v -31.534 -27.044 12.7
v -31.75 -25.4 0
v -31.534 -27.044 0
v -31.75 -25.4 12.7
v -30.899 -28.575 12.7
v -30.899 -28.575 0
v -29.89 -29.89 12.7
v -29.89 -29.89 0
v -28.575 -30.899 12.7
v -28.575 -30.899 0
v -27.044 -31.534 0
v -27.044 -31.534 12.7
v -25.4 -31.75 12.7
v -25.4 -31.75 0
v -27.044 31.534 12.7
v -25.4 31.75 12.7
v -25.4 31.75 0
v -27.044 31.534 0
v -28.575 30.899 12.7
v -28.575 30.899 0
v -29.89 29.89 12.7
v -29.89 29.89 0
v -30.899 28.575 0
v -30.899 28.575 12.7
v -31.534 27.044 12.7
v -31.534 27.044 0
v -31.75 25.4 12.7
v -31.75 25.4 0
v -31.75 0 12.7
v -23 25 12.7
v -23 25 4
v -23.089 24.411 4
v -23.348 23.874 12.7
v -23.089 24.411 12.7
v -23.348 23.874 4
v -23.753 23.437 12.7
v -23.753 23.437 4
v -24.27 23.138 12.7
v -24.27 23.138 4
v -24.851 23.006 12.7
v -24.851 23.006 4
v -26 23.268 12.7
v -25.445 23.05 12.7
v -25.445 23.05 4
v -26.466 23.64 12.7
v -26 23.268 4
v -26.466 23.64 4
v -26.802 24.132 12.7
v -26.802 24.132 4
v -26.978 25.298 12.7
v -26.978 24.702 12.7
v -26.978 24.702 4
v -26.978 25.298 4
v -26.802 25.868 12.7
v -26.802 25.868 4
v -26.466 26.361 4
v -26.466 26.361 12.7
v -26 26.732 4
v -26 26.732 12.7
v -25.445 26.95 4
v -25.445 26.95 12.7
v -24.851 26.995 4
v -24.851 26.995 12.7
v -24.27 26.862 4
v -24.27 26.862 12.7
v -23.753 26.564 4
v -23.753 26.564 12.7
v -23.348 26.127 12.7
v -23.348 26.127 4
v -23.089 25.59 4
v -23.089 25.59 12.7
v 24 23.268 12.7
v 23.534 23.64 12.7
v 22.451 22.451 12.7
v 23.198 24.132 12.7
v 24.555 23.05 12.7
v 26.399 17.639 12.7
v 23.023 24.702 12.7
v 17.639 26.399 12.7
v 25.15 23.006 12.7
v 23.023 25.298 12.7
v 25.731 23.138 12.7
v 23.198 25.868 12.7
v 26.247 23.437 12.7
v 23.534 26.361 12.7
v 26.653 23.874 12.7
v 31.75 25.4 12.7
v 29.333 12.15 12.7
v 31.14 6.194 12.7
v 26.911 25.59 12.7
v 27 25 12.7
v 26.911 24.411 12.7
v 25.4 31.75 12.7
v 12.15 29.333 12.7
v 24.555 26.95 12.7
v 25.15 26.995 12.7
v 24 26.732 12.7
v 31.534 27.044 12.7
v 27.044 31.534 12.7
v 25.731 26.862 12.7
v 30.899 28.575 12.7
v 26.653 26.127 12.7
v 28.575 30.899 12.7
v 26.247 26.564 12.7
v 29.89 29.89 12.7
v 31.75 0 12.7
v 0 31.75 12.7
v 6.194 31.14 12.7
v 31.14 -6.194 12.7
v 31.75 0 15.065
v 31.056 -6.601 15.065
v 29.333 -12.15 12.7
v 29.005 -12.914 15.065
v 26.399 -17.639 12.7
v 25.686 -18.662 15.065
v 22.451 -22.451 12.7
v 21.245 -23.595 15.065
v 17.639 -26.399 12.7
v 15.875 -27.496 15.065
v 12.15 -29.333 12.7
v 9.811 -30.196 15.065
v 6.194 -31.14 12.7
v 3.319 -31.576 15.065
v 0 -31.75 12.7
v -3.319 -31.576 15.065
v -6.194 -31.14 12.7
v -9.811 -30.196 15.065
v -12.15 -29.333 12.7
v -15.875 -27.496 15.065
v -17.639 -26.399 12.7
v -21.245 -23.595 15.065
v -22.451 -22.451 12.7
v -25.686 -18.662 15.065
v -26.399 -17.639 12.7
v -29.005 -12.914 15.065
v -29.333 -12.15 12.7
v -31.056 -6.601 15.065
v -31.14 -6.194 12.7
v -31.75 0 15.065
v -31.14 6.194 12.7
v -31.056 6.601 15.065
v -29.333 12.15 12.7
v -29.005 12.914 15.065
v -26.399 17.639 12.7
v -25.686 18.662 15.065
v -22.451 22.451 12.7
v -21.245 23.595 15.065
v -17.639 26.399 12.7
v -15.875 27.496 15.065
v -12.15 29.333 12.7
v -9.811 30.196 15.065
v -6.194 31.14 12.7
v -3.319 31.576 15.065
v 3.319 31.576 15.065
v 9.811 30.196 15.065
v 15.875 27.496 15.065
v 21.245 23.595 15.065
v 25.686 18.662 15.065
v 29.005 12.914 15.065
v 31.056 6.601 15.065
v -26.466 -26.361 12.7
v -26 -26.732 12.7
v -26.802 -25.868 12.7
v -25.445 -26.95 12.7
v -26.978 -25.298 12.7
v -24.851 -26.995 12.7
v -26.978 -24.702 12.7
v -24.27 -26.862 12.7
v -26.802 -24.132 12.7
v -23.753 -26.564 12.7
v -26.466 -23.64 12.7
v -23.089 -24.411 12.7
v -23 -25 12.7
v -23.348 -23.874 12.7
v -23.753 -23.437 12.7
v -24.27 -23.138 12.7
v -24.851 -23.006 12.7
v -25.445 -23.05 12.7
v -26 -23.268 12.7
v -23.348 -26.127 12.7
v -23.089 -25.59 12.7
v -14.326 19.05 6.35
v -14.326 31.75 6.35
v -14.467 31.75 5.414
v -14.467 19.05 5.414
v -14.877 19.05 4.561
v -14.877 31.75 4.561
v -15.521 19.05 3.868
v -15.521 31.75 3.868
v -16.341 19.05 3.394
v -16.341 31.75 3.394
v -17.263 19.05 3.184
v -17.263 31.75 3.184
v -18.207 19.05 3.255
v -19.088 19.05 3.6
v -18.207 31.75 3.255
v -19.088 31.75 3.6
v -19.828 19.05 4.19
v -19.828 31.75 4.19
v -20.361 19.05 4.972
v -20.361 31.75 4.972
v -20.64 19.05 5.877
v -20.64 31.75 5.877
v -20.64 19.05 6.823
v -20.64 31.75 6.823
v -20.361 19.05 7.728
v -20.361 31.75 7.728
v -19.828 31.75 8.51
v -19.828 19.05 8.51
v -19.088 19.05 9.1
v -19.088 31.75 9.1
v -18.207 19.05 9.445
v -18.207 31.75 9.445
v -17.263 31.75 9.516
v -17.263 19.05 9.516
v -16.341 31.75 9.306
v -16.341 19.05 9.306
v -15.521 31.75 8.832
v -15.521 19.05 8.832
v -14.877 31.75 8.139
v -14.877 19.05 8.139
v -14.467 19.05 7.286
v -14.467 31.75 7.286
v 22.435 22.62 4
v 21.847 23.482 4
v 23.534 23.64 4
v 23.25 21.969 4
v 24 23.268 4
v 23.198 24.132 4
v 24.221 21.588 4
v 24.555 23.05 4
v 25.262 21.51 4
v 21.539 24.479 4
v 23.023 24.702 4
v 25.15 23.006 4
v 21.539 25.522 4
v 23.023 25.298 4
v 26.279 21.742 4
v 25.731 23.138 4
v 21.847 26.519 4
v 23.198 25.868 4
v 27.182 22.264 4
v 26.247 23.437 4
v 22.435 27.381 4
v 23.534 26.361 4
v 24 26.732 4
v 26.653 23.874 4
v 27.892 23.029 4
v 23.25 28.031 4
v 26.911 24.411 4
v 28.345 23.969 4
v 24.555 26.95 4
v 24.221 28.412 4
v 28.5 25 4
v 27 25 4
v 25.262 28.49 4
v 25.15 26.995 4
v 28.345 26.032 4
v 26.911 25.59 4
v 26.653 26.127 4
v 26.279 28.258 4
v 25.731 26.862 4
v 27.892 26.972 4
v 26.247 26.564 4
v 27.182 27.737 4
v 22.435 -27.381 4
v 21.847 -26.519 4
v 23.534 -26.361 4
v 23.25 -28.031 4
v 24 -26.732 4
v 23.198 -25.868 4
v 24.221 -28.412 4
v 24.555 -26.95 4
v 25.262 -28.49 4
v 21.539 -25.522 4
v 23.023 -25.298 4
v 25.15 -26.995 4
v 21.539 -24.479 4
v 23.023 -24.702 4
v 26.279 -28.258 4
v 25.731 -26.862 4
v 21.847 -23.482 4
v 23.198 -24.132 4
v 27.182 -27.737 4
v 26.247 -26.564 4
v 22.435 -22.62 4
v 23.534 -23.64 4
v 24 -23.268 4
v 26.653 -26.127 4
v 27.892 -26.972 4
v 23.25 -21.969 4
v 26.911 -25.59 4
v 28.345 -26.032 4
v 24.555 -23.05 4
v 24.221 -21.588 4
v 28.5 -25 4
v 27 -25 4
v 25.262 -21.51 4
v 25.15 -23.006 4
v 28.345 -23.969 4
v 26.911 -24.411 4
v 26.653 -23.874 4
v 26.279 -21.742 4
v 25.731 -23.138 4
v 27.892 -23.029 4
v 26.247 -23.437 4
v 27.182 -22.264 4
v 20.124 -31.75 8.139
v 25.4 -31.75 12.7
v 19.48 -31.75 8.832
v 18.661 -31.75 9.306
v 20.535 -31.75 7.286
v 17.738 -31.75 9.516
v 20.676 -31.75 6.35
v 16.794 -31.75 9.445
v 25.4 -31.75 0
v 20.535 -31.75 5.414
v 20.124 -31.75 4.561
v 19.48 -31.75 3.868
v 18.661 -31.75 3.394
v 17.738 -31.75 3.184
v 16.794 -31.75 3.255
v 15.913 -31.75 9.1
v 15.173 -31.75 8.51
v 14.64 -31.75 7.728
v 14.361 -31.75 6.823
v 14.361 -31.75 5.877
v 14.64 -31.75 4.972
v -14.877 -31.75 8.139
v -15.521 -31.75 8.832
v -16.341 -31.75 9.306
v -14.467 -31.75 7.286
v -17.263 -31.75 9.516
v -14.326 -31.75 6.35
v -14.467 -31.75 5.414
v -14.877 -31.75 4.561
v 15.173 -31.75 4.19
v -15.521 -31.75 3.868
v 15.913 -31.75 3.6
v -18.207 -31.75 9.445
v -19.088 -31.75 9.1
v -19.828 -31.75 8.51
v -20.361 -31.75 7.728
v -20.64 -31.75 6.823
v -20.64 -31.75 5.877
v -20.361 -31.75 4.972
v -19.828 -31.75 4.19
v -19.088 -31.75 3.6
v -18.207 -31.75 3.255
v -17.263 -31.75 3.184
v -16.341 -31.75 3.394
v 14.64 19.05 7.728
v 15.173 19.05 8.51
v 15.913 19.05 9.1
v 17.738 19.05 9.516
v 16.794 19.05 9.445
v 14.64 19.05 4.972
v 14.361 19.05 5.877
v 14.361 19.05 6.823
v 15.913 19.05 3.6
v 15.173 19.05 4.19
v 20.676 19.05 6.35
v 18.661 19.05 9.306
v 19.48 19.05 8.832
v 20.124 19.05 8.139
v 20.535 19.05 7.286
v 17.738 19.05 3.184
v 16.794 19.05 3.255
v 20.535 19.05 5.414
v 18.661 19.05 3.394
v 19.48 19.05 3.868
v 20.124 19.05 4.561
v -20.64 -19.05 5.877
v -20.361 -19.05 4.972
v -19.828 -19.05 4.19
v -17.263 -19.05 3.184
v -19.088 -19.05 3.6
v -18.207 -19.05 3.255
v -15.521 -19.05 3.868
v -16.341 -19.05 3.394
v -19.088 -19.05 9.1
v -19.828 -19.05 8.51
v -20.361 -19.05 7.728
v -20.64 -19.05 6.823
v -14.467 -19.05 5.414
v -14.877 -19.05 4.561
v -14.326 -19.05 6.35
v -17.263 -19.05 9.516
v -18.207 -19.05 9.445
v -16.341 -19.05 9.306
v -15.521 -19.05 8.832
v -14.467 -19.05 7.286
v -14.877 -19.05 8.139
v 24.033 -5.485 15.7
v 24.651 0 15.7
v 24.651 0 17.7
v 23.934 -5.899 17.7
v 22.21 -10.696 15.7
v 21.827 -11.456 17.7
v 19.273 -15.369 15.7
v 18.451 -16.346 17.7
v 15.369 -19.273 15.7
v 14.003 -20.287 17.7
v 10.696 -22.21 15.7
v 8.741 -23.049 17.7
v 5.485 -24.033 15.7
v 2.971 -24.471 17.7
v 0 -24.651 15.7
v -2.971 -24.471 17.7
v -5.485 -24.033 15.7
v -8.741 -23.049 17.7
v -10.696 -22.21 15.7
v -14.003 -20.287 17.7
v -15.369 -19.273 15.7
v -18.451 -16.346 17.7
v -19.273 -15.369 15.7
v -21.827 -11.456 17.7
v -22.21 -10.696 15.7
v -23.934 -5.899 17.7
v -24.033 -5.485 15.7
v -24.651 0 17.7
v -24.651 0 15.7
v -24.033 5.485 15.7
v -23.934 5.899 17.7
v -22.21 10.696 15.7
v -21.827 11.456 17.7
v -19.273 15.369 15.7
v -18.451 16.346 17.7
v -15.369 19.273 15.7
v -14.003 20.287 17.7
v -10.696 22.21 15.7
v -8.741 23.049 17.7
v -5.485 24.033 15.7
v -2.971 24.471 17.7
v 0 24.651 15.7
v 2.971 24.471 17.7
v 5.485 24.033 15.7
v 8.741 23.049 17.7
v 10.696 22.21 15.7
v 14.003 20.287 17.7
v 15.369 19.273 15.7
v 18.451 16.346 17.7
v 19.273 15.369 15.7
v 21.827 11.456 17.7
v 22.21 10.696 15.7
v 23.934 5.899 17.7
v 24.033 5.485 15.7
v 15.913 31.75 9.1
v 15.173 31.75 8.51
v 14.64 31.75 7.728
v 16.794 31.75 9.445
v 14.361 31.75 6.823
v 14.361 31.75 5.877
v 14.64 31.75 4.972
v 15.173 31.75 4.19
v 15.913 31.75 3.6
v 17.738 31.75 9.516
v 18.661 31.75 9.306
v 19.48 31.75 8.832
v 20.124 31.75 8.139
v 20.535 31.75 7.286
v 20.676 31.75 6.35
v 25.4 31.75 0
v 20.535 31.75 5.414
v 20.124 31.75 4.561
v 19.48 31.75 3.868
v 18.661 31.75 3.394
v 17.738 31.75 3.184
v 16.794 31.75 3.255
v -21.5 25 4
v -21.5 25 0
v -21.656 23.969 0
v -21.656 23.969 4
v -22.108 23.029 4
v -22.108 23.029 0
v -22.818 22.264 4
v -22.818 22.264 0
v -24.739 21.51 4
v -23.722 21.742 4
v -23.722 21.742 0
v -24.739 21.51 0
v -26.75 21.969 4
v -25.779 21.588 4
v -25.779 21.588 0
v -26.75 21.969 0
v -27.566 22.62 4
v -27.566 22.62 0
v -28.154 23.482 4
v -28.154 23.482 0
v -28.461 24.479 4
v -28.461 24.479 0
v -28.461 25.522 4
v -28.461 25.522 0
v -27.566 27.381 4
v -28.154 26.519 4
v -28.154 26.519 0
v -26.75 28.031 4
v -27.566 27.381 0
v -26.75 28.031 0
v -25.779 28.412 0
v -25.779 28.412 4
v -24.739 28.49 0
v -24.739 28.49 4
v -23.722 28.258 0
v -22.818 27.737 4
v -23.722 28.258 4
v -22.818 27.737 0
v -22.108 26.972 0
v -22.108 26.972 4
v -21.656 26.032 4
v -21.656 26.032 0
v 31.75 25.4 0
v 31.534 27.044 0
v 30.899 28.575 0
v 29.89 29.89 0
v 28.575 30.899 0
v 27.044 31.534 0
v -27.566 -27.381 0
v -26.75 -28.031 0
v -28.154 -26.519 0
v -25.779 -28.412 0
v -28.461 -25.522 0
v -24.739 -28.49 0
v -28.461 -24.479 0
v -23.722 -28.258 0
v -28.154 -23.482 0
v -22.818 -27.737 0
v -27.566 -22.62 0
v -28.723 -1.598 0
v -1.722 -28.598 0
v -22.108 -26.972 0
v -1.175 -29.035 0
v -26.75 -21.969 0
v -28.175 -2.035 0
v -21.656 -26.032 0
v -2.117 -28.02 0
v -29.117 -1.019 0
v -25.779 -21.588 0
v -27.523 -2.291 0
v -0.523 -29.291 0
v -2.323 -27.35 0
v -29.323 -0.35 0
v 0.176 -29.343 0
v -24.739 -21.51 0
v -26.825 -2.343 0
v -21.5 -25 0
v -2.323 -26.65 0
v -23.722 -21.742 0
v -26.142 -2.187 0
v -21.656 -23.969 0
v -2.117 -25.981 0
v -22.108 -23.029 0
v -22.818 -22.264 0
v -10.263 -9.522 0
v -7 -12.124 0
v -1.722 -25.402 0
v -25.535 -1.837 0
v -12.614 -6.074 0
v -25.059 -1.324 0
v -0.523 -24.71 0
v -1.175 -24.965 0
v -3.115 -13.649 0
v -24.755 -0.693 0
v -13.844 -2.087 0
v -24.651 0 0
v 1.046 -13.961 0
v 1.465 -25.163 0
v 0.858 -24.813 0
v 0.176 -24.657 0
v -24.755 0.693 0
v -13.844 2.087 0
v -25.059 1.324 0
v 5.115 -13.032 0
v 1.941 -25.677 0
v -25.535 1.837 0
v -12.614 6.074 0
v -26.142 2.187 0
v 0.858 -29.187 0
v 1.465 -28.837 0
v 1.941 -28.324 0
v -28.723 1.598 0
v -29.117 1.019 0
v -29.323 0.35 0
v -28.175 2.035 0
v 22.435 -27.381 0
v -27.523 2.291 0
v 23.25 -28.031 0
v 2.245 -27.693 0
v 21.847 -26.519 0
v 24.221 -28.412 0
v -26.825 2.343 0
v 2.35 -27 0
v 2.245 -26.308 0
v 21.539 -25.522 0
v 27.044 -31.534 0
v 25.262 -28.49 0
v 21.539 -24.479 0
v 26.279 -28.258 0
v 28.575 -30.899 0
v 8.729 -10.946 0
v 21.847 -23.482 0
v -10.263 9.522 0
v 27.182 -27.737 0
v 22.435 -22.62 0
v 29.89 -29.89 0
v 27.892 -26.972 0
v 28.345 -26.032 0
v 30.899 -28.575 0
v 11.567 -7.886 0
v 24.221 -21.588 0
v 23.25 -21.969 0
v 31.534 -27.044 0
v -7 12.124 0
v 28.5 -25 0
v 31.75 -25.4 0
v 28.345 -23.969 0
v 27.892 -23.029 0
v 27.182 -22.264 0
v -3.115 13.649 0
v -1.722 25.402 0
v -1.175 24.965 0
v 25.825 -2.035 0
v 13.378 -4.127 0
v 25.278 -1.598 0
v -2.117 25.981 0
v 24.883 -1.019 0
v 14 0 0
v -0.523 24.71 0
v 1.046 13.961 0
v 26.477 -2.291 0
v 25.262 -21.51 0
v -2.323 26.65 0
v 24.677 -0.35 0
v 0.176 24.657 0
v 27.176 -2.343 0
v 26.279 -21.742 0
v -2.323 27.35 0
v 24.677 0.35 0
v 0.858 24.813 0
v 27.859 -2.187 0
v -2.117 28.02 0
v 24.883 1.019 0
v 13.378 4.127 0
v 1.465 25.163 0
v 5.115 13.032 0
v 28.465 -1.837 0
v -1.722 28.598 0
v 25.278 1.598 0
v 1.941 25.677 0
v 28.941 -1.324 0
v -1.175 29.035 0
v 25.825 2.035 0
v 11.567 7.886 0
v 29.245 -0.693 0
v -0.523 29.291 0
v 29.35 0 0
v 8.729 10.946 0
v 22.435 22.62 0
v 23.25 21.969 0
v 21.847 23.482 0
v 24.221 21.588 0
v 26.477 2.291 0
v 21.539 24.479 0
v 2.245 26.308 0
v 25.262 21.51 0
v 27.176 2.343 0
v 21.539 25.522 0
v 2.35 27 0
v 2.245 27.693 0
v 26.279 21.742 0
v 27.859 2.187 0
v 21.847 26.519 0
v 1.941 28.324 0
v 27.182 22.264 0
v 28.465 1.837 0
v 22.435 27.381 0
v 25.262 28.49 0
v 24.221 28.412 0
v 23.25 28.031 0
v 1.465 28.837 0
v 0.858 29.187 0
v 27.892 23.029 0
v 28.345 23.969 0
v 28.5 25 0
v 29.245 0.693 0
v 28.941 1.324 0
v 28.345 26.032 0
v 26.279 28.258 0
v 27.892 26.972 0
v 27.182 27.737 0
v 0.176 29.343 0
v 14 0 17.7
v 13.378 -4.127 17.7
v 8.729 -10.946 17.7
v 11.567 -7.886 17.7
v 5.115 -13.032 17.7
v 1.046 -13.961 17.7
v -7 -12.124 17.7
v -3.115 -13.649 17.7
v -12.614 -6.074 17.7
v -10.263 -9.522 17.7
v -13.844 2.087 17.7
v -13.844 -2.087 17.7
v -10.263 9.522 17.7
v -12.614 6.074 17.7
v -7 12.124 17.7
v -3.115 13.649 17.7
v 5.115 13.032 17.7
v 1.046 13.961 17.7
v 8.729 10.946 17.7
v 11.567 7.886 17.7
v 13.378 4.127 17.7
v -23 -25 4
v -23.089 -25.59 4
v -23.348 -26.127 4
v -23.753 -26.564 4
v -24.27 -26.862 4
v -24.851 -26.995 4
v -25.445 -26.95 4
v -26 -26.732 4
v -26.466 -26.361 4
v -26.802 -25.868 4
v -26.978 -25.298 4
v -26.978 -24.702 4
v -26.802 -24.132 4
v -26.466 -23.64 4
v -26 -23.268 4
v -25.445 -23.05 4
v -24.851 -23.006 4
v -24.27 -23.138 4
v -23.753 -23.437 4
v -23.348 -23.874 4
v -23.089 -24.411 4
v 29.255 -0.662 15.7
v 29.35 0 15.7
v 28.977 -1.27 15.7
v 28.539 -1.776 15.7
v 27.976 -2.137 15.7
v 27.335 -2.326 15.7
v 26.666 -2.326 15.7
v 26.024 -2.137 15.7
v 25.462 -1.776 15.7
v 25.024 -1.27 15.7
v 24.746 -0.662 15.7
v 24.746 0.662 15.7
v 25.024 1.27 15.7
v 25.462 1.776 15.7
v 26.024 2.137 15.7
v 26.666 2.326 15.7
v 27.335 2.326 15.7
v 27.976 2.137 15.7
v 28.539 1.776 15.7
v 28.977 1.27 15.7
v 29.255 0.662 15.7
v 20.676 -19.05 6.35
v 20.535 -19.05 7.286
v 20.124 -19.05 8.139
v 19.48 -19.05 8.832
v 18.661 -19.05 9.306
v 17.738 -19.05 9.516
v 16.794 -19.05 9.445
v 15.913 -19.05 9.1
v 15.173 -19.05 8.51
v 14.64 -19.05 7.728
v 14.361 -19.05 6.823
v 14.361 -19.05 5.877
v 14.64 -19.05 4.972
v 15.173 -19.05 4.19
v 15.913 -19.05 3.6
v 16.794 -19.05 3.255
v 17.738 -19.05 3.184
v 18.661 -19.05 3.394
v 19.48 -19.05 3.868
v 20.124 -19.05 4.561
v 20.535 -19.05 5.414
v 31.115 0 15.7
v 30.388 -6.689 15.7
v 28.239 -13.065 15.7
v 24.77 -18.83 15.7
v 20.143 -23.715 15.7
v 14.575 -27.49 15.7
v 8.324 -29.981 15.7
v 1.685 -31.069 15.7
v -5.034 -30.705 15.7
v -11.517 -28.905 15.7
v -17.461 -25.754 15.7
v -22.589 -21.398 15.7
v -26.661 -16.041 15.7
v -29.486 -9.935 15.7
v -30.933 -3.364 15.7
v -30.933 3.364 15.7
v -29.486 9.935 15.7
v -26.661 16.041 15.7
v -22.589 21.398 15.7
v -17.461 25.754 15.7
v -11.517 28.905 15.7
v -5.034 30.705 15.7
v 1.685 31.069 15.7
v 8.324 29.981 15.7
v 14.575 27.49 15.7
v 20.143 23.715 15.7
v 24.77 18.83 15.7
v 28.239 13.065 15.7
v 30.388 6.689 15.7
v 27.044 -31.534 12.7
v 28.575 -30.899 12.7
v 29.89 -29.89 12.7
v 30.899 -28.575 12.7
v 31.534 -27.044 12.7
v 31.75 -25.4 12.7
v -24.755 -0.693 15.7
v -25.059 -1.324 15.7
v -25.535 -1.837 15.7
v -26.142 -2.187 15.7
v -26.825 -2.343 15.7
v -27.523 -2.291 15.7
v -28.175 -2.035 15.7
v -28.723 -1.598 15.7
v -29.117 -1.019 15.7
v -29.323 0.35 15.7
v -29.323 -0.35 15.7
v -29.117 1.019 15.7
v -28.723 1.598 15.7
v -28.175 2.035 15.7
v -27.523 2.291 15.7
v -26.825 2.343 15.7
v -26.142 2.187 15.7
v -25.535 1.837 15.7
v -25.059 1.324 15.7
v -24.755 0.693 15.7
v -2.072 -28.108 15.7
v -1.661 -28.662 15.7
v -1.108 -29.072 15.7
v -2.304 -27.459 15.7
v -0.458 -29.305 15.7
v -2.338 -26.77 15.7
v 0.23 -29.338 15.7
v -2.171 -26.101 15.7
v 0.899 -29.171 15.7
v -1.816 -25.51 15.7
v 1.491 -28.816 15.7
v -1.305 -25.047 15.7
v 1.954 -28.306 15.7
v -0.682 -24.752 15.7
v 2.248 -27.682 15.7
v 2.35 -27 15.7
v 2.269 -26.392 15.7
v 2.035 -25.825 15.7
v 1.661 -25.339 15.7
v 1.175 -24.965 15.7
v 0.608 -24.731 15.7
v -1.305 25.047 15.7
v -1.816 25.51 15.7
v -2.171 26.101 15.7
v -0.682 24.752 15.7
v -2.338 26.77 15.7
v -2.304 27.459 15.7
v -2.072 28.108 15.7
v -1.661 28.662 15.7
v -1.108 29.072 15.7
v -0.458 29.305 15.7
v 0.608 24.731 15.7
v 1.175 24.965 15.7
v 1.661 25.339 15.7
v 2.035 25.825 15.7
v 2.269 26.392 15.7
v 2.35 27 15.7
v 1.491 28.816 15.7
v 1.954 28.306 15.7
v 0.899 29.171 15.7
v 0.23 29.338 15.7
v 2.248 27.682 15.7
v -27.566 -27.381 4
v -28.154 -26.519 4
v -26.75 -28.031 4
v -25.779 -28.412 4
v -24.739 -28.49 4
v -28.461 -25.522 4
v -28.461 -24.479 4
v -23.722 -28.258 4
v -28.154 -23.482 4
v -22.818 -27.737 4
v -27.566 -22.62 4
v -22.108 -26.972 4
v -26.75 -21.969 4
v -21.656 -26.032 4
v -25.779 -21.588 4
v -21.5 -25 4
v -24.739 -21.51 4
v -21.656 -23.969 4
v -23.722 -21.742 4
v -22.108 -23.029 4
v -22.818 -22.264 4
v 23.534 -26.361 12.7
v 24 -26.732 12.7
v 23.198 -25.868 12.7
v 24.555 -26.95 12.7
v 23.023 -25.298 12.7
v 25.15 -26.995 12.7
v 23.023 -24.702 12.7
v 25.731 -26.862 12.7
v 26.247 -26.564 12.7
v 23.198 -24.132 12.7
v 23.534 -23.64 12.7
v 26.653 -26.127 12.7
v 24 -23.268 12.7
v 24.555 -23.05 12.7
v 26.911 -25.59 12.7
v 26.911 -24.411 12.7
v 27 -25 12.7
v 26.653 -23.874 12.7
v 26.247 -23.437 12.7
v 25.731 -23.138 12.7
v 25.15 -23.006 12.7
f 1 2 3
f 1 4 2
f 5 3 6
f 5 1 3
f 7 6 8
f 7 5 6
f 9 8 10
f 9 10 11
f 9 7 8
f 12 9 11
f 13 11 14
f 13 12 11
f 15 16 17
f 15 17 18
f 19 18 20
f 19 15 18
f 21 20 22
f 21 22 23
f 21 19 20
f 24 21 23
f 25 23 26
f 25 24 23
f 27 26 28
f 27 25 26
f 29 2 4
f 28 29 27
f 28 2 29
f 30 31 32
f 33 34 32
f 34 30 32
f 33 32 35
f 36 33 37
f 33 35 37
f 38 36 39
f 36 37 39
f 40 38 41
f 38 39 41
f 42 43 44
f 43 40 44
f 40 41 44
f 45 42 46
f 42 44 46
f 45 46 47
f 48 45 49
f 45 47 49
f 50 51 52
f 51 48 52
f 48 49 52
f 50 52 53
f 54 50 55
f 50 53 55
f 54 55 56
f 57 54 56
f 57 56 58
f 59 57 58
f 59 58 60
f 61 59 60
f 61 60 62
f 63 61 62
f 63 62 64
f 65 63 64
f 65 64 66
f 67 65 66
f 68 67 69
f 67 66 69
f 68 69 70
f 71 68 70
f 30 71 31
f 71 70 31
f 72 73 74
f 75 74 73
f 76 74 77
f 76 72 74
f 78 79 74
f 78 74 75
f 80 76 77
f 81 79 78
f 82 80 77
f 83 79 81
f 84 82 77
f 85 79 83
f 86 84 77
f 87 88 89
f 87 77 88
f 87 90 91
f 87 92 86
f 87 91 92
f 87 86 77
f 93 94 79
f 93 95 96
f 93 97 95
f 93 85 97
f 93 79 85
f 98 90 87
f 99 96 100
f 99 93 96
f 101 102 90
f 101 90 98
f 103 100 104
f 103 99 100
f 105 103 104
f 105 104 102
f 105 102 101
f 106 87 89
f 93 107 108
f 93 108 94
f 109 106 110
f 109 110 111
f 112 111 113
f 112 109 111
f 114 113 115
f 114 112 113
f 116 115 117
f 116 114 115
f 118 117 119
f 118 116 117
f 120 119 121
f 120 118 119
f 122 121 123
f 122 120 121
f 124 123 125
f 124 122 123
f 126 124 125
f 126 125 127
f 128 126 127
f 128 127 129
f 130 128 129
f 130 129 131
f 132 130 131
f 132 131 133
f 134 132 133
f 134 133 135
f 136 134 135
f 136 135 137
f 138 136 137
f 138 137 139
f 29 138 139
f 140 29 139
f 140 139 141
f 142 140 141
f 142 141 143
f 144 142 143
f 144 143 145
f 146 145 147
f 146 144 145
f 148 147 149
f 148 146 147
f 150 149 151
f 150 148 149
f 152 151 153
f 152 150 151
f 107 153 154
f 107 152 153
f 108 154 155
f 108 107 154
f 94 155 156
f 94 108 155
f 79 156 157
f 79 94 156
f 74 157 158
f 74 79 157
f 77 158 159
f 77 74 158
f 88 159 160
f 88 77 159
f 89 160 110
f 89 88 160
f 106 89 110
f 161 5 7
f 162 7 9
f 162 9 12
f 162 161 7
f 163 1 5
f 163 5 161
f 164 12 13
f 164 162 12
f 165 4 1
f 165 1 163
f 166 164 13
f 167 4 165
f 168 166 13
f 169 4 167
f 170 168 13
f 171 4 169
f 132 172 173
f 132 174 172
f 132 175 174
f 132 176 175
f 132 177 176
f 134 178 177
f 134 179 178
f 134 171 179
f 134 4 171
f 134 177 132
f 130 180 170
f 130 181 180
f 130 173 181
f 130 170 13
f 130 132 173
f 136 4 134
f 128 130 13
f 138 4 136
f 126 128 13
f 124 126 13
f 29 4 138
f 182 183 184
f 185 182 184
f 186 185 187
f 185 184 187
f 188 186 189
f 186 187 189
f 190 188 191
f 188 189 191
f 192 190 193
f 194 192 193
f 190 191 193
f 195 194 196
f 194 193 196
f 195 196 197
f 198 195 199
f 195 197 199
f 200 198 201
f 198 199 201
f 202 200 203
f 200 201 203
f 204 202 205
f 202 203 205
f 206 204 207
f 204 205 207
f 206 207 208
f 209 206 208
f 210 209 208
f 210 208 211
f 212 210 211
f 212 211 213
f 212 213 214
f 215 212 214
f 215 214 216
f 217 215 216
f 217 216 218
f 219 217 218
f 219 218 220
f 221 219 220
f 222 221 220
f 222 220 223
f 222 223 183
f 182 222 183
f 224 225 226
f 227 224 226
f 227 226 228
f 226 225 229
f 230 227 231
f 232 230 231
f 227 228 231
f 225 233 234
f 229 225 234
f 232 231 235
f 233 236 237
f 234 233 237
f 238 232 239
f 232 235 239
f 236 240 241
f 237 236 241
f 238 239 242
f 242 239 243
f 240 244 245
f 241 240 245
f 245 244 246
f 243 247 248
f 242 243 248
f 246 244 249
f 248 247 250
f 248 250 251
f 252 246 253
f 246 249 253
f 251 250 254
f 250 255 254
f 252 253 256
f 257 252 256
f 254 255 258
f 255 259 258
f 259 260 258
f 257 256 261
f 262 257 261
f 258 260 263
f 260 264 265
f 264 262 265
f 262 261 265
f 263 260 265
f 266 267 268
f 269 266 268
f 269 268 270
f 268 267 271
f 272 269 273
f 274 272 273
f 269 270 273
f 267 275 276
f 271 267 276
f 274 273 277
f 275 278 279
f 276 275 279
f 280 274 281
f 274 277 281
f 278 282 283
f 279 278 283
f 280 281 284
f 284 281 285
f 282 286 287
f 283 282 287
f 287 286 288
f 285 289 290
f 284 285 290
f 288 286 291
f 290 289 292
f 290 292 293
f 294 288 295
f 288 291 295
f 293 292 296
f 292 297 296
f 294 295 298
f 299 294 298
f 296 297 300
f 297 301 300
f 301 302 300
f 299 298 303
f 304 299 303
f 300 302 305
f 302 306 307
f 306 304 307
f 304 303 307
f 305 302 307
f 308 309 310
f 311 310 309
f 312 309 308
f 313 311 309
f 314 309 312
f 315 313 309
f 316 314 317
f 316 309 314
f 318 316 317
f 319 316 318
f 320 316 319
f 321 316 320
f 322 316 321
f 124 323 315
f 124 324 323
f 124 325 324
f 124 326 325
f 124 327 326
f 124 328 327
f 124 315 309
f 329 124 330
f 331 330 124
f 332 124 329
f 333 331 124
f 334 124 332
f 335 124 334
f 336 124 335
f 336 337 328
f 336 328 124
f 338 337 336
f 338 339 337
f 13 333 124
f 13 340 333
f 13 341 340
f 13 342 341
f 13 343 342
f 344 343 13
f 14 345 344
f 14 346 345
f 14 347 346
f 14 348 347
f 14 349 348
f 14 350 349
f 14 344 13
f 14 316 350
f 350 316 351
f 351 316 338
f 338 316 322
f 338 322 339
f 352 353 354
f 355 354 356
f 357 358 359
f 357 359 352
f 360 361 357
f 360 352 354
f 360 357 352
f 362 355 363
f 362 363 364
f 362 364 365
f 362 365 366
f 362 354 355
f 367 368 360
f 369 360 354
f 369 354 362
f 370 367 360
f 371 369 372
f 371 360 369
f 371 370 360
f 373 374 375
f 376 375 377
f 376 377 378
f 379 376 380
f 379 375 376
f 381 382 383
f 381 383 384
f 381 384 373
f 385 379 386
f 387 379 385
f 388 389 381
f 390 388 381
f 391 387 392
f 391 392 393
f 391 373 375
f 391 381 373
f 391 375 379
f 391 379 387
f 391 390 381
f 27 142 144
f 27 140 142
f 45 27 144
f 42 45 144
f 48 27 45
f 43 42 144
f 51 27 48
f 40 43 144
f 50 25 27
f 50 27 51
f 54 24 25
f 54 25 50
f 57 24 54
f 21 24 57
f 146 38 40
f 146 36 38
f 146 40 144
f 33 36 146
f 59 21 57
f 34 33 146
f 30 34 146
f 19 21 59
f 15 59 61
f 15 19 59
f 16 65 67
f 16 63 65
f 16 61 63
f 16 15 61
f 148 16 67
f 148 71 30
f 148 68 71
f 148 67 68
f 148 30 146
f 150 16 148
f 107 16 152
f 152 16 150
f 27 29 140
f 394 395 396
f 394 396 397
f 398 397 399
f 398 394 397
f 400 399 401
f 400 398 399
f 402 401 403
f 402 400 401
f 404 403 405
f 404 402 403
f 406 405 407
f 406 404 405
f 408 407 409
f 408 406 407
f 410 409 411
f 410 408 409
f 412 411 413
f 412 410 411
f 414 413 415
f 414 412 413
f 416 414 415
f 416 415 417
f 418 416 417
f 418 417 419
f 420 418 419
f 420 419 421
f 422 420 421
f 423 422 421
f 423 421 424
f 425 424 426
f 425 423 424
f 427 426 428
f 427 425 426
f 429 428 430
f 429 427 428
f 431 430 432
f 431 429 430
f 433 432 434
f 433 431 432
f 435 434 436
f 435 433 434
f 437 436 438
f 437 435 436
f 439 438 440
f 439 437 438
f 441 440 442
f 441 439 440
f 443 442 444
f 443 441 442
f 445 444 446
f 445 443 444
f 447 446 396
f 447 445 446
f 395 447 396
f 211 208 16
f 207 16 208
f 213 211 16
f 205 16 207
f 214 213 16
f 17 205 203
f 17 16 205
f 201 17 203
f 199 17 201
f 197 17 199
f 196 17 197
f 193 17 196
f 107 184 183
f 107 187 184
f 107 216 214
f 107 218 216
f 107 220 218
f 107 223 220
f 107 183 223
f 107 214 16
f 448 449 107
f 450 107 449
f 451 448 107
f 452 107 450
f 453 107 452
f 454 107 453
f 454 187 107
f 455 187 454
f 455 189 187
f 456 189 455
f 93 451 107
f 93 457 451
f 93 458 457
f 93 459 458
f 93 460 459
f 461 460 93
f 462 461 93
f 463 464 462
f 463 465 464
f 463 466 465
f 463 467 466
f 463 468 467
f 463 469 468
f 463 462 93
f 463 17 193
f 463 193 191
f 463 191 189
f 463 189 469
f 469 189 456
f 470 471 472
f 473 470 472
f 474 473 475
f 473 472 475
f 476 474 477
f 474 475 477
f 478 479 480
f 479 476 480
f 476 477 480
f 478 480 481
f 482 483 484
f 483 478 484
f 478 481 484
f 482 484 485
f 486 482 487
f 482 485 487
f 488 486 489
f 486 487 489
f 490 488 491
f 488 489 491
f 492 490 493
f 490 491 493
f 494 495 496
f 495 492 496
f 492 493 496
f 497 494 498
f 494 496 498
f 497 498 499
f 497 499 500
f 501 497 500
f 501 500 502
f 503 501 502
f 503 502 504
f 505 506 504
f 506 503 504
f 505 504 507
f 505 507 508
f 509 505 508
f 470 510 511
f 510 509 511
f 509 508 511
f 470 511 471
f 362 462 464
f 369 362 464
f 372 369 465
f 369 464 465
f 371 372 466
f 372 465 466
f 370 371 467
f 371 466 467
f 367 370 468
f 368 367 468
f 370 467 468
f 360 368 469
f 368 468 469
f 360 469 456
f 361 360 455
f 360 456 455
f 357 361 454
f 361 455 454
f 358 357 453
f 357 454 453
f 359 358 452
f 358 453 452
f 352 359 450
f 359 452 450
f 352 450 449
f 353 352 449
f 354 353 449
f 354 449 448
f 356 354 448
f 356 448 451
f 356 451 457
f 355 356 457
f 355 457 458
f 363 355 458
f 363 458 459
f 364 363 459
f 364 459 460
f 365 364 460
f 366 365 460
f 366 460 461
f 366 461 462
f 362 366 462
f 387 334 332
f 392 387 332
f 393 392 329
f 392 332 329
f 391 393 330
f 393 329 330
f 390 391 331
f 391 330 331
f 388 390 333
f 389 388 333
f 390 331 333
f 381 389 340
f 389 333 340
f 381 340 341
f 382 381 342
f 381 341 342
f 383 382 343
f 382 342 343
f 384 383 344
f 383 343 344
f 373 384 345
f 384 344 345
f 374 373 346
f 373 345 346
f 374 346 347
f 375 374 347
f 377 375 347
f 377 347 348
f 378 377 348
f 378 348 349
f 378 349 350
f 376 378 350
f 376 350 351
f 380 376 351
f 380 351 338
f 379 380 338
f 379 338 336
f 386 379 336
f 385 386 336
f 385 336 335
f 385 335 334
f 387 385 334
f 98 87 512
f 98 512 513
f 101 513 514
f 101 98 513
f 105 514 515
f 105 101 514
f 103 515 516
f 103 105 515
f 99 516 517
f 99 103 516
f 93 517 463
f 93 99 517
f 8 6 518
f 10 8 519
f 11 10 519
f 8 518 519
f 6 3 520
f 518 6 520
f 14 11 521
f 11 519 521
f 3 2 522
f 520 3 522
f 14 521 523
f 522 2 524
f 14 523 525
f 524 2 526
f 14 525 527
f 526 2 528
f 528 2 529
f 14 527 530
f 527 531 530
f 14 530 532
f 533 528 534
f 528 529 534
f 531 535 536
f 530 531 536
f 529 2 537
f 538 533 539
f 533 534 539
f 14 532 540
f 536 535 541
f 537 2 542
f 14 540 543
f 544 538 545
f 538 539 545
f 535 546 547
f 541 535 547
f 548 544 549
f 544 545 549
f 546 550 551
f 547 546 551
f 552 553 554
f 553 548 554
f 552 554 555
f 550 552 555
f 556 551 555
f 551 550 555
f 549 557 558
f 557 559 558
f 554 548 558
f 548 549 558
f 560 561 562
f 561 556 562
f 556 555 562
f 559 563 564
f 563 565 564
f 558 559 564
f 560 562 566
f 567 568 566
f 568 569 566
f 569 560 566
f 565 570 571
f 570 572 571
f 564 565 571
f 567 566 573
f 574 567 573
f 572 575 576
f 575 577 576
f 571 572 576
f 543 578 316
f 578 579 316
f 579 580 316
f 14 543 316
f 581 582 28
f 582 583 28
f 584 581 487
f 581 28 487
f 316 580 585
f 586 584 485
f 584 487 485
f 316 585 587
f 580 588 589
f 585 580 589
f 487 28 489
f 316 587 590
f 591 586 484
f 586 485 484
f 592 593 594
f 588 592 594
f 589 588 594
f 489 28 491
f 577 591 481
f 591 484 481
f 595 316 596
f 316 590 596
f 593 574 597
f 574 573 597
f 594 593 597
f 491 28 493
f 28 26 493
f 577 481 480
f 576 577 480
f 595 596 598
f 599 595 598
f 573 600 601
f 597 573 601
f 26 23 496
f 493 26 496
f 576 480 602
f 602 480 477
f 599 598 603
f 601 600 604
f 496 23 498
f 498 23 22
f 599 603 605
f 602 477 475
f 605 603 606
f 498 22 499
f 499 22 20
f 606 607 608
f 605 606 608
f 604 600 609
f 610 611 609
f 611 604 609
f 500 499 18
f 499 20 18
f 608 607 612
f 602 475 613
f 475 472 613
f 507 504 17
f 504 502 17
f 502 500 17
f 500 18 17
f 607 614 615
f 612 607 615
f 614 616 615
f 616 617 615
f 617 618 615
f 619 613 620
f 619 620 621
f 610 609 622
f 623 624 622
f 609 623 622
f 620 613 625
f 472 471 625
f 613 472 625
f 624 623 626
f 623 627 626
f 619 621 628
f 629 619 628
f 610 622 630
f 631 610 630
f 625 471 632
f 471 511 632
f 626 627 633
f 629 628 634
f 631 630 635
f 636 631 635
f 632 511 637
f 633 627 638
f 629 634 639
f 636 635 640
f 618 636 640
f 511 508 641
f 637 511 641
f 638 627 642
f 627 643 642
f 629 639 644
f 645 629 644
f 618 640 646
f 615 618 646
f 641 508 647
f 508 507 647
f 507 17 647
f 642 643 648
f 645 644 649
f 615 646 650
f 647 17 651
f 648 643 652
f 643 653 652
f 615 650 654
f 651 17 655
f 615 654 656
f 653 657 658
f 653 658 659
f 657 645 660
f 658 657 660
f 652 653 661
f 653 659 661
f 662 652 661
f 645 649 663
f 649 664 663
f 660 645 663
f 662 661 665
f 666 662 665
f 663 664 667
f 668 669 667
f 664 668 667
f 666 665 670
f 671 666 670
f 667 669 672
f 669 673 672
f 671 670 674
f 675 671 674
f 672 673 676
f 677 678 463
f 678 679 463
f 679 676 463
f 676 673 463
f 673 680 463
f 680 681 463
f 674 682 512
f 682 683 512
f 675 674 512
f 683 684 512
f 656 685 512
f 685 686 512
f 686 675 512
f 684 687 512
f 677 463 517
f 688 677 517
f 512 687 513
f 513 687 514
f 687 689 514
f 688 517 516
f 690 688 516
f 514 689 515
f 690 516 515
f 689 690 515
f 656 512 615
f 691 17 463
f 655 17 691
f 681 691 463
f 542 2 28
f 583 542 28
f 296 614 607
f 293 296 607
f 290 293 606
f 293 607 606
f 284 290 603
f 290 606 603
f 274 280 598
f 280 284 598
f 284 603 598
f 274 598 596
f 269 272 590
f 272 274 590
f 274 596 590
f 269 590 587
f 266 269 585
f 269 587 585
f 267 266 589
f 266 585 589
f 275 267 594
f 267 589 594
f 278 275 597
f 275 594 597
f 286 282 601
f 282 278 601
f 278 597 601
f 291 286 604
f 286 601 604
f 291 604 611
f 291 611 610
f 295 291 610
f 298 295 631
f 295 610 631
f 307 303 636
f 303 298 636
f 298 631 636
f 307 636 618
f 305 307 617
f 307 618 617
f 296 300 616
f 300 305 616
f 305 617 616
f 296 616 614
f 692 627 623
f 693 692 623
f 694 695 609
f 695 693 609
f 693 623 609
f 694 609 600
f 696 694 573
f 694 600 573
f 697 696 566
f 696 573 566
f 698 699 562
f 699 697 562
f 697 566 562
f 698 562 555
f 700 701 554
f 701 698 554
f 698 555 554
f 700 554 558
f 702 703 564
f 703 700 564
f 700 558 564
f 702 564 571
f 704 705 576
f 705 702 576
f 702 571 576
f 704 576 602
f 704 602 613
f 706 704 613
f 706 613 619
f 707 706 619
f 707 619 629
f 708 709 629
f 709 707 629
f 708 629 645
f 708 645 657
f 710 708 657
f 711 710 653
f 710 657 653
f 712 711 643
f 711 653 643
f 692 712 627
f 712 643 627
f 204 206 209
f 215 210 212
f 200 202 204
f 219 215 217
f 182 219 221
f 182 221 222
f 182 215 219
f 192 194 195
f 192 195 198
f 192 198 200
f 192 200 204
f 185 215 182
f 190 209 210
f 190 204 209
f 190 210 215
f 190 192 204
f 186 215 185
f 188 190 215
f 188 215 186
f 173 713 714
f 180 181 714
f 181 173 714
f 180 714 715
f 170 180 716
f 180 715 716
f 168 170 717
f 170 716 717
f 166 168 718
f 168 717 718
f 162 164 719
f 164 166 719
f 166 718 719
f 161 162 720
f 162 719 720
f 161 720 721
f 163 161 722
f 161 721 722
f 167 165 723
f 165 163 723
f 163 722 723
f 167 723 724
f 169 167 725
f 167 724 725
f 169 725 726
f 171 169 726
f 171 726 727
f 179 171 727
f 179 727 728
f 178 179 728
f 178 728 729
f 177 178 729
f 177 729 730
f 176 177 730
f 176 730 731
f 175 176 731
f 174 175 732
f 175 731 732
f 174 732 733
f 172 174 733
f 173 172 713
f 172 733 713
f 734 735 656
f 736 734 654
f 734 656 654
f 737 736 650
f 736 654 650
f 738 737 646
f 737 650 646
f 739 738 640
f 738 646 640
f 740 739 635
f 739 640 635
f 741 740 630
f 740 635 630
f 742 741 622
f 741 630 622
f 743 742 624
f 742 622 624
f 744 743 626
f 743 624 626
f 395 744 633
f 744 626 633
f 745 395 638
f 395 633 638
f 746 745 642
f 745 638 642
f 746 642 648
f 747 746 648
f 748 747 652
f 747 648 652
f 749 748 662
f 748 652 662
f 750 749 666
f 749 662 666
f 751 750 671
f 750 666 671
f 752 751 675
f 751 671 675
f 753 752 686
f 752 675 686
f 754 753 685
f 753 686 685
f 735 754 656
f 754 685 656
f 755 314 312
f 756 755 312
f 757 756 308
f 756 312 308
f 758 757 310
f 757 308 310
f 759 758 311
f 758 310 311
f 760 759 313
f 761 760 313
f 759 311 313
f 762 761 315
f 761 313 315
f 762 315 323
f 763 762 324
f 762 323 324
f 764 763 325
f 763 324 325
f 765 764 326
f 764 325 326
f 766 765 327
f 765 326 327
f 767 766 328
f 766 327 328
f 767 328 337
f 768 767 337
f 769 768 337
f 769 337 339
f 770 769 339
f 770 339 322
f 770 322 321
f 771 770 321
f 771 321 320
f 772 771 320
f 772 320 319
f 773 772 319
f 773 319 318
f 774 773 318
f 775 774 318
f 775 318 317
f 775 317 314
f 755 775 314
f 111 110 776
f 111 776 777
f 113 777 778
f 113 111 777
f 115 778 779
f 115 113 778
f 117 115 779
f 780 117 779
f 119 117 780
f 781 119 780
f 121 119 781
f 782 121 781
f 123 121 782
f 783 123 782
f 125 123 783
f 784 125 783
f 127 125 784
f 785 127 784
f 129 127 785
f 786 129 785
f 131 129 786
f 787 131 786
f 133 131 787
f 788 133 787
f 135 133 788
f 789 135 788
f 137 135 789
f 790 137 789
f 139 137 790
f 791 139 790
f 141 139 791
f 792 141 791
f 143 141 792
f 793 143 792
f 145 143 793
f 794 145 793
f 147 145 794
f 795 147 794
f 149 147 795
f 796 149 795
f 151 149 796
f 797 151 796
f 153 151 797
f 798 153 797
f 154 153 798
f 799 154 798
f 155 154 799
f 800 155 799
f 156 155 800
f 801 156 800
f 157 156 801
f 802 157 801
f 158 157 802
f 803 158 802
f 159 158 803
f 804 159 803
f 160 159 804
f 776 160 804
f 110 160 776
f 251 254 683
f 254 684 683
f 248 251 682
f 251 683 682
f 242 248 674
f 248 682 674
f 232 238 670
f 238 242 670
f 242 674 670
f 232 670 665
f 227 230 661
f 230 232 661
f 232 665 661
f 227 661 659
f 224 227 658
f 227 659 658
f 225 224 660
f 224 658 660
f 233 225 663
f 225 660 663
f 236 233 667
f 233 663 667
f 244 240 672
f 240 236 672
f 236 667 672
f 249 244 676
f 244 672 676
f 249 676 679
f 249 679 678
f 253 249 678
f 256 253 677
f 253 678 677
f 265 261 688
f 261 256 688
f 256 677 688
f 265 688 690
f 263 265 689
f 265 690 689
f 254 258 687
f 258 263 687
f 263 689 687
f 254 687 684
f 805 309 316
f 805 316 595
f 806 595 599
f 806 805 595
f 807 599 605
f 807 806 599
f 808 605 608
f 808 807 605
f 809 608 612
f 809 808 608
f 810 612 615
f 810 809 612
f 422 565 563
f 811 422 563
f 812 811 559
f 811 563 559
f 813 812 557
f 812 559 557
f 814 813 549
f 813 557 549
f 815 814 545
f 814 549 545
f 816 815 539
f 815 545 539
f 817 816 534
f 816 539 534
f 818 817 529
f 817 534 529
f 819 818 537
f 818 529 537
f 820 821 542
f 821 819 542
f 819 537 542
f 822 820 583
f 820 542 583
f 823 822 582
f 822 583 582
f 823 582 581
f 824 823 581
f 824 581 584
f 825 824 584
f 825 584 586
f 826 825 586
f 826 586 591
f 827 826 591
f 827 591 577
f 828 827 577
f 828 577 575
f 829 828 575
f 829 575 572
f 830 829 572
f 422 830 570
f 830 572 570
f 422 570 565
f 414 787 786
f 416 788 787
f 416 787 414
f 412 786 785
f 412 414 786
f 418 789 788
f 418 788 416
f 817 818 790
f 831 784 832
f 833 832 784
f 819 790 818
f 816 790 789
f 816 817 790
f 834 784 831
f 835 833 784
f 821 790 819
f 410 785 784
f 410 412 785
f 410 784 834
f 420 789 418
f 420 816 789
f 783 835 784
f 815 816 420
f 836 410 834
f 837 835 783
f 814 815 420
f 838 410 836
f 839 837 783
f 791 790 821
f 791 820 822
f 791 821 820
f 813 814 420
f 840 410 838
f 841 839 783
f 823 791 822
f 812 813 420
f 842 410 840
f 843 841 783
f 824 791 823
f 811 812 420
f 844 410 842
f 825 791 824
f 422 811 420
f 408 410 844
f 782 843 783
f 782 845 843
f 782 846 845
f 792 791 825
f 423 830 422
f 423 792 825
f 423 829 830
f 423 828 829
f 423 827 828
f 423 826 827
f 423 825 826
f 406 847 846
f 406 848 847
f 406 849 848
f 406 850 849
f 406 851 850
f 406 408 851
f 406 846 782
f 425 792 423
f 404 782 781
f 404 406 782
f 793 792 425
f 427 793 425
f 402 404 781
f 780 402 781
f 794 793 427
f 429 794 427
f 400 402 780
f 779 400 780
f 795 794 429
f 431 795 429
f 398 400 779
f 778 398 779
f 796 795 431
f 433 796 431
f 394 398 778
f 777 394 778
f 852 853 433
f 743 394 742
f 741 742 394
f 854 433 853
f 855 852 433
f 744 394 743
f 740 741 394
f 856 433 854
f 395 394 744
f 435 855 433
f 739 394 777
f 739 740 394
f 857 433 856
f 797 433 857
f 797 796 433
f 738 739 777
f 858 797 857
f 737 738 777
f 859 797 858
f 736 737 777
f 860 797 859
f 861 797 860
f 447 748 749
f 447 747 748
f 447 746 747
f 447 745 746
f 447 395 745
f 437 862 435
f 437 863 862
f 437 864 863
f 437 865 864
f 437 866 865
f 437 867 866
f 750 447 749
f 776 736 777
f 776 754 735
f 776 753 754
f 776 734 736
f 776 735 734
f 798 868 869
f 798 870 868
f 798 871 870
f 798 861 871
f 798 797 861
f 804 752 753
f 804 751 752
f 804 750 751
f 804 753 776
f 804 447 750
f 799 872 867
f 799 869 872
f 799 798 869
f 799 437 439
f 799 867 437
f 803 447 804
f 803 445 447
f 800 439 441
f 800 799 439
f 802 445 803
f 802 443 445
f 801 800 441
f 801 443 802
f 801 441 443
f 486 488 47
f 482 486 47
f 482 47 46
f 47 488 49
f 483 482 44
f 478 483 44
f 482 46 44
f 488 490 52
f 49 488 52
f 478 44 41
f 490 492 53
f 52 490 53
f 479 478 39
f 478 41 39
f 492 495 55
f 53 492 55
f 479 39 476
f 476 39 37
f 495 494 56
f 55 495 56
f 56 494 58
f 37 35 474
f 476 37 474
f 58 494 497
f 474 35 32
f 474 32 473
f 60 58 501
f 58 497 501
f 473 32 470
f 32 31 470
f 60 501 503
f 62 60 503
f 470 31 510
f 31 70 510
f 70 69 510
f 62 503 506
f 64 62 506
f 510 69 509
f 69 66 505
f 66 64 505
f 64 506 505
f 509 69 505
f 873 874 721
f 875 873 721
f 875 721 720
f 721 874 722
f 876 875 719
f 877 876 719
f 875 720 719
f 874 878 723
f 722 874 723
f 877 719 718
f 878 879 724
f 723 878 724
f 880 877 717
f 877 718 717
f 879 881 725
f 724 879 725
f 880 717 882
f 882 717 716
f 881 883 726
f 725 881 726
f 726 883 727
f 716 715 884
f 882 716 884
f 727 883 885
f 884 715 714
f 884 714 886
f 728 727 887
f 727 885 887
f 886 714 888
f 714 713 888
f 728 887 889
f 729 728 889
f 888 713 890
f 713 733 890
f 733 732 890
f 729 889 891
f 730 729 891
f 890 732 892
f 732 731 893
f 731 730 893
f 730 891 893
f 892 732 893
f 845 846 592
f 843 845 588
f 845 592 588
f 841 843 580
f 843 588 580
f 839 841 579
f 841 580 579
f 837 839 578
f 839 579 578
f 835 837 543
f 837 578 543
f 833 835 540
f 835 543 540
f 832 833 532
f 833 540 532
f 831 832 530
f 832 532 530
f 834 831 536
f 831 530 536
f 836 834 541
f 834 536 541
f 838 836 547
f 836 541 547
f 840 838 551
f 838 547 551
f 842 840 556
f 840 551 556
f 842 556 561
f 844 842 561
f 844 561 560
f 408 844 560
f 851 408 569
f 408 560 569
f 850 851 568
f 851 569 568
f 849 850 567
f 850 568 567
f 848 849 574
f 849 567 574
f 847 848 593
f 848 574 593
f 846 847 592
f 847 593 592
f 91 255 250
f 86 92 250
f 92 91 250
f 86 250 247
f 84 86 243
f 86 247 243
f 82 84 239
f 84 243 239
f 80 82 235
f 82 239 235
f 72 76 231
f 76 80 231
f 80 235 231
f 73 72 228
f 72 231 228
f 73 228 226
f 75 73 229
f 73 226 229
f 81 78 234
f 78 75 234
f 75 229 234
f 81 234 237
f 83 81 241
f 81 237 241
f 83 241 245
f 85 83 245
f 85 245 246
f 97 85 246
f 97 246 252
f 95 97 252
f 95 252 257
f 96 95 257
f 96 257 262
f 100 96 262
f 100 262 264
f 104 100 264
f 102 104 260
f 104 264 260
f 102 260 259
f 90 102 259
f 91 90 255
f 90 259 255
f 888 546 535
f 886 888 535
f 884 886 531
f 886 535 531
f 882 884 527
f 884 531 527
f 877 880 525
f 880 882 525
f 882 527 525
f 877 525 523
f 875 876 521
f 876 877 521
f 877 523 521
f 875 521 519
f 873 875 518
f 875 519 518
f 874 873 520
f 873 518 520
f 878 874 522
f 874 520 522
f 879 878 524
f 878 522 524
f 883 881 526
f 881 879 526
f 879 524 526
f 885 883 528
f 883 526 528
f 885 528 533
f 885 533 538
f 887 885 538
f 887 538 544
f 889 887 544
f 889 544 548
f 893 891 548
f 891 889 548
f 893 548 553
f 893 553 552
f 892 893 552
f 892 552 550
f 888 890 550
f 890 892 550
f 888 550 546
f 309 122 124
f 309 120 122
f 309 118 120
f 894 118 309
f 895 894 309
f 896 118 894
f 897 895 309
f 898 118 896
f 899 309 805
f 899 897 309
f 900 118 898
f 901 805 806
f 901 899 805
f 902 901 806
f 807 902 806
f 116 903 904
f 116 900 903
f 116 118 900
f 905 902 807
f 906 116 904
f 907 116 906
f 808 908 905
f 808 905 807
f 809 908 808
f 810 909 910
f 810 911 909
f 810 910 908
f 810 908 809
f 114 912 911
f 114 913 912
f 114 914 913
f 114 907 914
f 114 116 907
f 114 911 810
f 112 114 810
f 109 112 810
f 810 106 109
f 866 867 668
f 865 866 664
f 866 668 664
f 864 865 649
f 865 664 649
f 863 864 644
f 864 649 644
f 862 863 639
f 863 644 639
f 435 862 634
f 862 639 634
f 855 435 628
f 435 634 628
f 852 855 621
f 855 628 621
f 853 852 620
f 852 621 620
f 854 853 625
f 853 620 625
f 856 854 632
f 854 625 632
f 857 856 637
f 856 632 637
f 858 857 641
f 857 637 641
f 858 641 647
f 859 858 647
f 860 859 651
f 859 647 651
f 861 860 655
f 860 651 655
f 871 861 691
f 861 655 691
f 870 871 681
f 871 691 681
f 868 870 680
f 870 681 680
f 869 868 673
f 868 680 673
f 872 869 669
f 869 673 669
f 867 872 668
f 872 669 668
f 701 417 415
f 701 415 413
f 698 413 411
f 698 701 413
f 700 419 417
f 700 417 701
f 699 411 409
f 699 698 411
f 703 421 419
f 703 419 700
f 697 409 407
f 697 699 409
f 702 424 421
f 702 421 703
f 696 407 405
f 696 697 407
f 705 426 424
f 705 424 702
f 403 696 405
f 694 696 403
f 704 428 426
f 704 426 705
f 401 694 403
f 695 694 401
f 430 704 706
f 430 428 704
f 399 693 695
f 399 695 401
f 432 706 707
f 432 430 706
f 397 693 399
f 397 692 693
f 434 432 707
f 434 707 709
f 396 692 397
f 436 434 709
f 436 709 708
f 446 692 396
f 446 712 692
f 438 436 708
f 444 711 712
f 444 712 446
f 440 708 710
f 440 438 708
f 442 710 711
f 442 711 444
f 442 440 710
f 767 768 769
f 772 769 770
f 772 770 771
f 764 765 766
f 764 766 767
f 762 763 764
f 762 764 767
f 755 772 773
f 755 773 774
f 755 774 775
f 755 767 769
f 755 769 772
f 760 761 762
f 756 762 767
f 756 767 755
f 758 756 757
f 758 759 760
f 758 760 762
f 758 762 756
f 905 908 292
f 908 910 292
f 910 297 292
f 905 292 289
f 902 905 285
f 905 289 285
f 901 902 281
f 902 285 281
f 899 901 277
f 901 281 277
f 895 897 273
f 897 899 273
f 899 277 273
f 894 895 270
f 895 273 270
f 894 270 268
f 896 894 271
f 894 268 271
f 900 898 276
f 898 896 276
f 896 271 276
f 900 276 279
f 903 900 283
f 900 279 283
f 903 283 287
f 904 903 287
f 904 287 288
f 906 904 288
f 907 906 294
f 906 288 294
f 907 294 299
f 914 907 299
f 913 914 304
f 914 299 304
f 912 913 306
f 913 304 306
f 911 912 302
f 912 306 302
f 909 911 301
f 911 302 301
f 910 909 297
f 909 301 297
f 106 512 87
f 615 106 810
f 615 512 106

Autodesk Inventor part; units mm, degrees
ref_plane "YZ Plane" through (0, 0, 0) normal (1, 0, 0) x (0, 1, 0)
ref_plane "XZ Plane" through (0, 0, 0) normal (0, 1, 0) x (-1, 0, 0)
ref_plane "XY Plane" through (0, 0, 0) normal (0, 0, 1) x (1, 0, 0)
sketch "Sketch1" plane through (0, 0, 0) normal (0, 0, 1) x (1, 0, 0)
  circle A0 centre (0, 0) radius 14
  line L0 (-31.75, 31.75) -> (31.75, 31.75)
  line L1 (31.75, 31.75) -> (31.75, -31.75)
  line L2 (31.75, -31.75) -> (-31.75, -31.75)
  line L3 (-31.75, -31.75) -> (-31.75, 31.75)
  circle A1 centre (0, 27.0002) radius 2.3495
  line L4 (-31.75, 0) -> (31.75, 0) construction
  line L5 (0, 31.75) -> (0, -31.75) construction
  circle A2 centre (-27.0002, 0) radius 2.3495
  circle A3 centre (27.0002, 0) radius 2.3495
  circle A4 centre (0, -27.0002) radius 2.3495
  circle A5 centre (-25.0002, 25.0002) radius 2
  line L6 (-27.0002, -27.0002) -> (27.0002, -27.0002) construction
  line L7 (27.0002, -27.0002) -> (27.0002, 27.0002) construction
  line L8 (27.0002, 27.0002) -> (-27.0002, 27.0002) construction
  line L9 (-27.0002, 27.0002) -> (-27.0002, -27.0002) construction
  circle A6 centre (-25.0002, 25.0002) radius 3.5
  circle A7 centre (25.0002, 25.0002) radius 2
  circle A8 centre (25.0002, 25.0002) radius 3.5
  circle A9 centre (-25.0002, -25.0002) radius 2
  circle A10 centre (-25.0002, -25.0002) radius 3.5
  circle A11 centre (25.0002, -25.0002) radius 2
  circle A12 centre (25.0002, -25.0002) radius 3.5
  dimension "d2" = 28
  dimension "d7" = 63.5
  dimension "d8" = 63.5
  dimension "d9" = 27.0002
  dimension "d10" = 4.699
  dimension "d11" = 27.0002
  dimension "d12" = 27.0002
  dimension "d13" = 27.0002
  dimension "d14" = 54.0004
  dimension "d17" = 4
  dimension "d18" = 7
extrude "Extrusion1" add sketch "Sketch1" along normal blind 12.7 contours L0 L1 L2 L3 | A6 | A8 | A10 | A12
extrude "Extrusion2" cut sketch "Sketch1" along normal blind 4 contours A6 | A8 | A10 | A12
fillet "Fillet1" radius 6.35 4 edges at (31.75, 31.75, 6.35) (-31.75, 31.75, 6.35) (31.75, -31.75, 6.35) (-31.75, -31.75, 6.35)
sketch "Sketch2" plane through (0, 0, 12.7) normal (0, 0, 1) x (1, 0, 0)
  circle A0 centre (0, 0) radius 14 projected
  circle A1 centre (0, -27.0002) radius 2.3495 projected
  circle A2 centre (27.0002, 0) radius 2.3495 projected
  circle A3 centre (-27.0002, 0) radius 2.3495 projected
  circle A4 centre (0, 27.0002) radius 2.3495 projected
  circle A5 centre (0, 0) radius 31.75
  dimension "d22" = 63.5
extrude "Extrusion3" add sketch "Sketch2" along normal blind 3
sketch "Sketch3" plane through (0, 0, 15.7) normal (0, 0, 1) x (1, 0, 0)
  circle A0 centre (0, 0) radius 14 projected
  circle A1 centre (27.0002, 0) radius 2.3495 projected
  circle A2 centre (0, 0) radius 31.75 projected
  circle A3 centre (0, 0) radius 24.6507
extrude "Extrusion4" add sketch "Sketch3" along normal blind 2 contours A3
thread "Thread1" size "10-32 UNF" class "2B" standard "ANSI Unified Screw Threads" full length
thread "Thread2" size "10-32 UNF" class "2B" standard "ANSI Unified Screw Threads" full length
thread "Thread3" size "10-32 UNF" class "2B" standard "ANSI Unified Screw Threads" full length
thread "Thread4" size "10-32 UNF" class "2B" standard "ANSI Unified Screw Threads" full length
chamfer "Chamfer1" distance 0.635 angle 45 1 edges at (-31.75, 0, 15.7)
sketch "Sketch4" plane through (-25.4, 31.75, 0) normal (0, 1, 0) x (1, 0, 0)
  line L0 (50.8, -12.7) -> (25.4, -12.7) projected
  line L1 (25.4, 0) -> (25.4, -12.7) construction
  line L2 (7.8994, -6.35) -> (42.9006, -6.35) construction
  circle A0 centre (7.8994, -6.35) radius 3.175
  circle A1 centre (42.9006, -6.35) radius 3.175
  point P0 (25.4, -6.35)
  dimension "d38" = 35.0012
  dimension "d40" = 6.35
extrude "Extrusion5" cut sketch "Sketch4" against normal blind 12.7
sketch "Sketch5" plane through (-25.4, -31.75, 0) normal (0, -1, 0) x (1, 0, 0)
  line L0 (0, 12.7) -> (25.4, 12.7) projected
  line L1 (25.4, 0) -> (25.4, 12.7) construction
  line L2 (7.8994, 6.35) -> (42.9006, 6.35) construction
  circle A0 centre (7.8994, 6.35) radius 3.175
  circle A1 centre (42.9006, 6.35) radius 3.175
  point P0 (25.4, 6.35)
  dimension "d43" = 35.0012
  dimension "d45" = 6.35
extrude "Extrusion6" cut sketch "Sketch5" against normal blind 12.7
thread "Thread5" size "1/4-20 UNC" class "2B" standard "ANSI Unified Screw Threads" full length
thread "Thread6" size "1/4-20 UNC" class "2B" standard "ANSI Unified Screw Threads" full length
thread "Thread7" size "1/4-20 UNC" class "2B" standard "ANSI Unified Screw Threads" full length
thread "Thread8" size "1/4-20 UNC" class "2B" standard "ANSI Unified Screw Threads" full length
equation "\"d11\" = d9"
equation "\"d12\" = d9"
equation "\"d13\" = d9"
properties part number "P80 Front Block" material "Steel"
